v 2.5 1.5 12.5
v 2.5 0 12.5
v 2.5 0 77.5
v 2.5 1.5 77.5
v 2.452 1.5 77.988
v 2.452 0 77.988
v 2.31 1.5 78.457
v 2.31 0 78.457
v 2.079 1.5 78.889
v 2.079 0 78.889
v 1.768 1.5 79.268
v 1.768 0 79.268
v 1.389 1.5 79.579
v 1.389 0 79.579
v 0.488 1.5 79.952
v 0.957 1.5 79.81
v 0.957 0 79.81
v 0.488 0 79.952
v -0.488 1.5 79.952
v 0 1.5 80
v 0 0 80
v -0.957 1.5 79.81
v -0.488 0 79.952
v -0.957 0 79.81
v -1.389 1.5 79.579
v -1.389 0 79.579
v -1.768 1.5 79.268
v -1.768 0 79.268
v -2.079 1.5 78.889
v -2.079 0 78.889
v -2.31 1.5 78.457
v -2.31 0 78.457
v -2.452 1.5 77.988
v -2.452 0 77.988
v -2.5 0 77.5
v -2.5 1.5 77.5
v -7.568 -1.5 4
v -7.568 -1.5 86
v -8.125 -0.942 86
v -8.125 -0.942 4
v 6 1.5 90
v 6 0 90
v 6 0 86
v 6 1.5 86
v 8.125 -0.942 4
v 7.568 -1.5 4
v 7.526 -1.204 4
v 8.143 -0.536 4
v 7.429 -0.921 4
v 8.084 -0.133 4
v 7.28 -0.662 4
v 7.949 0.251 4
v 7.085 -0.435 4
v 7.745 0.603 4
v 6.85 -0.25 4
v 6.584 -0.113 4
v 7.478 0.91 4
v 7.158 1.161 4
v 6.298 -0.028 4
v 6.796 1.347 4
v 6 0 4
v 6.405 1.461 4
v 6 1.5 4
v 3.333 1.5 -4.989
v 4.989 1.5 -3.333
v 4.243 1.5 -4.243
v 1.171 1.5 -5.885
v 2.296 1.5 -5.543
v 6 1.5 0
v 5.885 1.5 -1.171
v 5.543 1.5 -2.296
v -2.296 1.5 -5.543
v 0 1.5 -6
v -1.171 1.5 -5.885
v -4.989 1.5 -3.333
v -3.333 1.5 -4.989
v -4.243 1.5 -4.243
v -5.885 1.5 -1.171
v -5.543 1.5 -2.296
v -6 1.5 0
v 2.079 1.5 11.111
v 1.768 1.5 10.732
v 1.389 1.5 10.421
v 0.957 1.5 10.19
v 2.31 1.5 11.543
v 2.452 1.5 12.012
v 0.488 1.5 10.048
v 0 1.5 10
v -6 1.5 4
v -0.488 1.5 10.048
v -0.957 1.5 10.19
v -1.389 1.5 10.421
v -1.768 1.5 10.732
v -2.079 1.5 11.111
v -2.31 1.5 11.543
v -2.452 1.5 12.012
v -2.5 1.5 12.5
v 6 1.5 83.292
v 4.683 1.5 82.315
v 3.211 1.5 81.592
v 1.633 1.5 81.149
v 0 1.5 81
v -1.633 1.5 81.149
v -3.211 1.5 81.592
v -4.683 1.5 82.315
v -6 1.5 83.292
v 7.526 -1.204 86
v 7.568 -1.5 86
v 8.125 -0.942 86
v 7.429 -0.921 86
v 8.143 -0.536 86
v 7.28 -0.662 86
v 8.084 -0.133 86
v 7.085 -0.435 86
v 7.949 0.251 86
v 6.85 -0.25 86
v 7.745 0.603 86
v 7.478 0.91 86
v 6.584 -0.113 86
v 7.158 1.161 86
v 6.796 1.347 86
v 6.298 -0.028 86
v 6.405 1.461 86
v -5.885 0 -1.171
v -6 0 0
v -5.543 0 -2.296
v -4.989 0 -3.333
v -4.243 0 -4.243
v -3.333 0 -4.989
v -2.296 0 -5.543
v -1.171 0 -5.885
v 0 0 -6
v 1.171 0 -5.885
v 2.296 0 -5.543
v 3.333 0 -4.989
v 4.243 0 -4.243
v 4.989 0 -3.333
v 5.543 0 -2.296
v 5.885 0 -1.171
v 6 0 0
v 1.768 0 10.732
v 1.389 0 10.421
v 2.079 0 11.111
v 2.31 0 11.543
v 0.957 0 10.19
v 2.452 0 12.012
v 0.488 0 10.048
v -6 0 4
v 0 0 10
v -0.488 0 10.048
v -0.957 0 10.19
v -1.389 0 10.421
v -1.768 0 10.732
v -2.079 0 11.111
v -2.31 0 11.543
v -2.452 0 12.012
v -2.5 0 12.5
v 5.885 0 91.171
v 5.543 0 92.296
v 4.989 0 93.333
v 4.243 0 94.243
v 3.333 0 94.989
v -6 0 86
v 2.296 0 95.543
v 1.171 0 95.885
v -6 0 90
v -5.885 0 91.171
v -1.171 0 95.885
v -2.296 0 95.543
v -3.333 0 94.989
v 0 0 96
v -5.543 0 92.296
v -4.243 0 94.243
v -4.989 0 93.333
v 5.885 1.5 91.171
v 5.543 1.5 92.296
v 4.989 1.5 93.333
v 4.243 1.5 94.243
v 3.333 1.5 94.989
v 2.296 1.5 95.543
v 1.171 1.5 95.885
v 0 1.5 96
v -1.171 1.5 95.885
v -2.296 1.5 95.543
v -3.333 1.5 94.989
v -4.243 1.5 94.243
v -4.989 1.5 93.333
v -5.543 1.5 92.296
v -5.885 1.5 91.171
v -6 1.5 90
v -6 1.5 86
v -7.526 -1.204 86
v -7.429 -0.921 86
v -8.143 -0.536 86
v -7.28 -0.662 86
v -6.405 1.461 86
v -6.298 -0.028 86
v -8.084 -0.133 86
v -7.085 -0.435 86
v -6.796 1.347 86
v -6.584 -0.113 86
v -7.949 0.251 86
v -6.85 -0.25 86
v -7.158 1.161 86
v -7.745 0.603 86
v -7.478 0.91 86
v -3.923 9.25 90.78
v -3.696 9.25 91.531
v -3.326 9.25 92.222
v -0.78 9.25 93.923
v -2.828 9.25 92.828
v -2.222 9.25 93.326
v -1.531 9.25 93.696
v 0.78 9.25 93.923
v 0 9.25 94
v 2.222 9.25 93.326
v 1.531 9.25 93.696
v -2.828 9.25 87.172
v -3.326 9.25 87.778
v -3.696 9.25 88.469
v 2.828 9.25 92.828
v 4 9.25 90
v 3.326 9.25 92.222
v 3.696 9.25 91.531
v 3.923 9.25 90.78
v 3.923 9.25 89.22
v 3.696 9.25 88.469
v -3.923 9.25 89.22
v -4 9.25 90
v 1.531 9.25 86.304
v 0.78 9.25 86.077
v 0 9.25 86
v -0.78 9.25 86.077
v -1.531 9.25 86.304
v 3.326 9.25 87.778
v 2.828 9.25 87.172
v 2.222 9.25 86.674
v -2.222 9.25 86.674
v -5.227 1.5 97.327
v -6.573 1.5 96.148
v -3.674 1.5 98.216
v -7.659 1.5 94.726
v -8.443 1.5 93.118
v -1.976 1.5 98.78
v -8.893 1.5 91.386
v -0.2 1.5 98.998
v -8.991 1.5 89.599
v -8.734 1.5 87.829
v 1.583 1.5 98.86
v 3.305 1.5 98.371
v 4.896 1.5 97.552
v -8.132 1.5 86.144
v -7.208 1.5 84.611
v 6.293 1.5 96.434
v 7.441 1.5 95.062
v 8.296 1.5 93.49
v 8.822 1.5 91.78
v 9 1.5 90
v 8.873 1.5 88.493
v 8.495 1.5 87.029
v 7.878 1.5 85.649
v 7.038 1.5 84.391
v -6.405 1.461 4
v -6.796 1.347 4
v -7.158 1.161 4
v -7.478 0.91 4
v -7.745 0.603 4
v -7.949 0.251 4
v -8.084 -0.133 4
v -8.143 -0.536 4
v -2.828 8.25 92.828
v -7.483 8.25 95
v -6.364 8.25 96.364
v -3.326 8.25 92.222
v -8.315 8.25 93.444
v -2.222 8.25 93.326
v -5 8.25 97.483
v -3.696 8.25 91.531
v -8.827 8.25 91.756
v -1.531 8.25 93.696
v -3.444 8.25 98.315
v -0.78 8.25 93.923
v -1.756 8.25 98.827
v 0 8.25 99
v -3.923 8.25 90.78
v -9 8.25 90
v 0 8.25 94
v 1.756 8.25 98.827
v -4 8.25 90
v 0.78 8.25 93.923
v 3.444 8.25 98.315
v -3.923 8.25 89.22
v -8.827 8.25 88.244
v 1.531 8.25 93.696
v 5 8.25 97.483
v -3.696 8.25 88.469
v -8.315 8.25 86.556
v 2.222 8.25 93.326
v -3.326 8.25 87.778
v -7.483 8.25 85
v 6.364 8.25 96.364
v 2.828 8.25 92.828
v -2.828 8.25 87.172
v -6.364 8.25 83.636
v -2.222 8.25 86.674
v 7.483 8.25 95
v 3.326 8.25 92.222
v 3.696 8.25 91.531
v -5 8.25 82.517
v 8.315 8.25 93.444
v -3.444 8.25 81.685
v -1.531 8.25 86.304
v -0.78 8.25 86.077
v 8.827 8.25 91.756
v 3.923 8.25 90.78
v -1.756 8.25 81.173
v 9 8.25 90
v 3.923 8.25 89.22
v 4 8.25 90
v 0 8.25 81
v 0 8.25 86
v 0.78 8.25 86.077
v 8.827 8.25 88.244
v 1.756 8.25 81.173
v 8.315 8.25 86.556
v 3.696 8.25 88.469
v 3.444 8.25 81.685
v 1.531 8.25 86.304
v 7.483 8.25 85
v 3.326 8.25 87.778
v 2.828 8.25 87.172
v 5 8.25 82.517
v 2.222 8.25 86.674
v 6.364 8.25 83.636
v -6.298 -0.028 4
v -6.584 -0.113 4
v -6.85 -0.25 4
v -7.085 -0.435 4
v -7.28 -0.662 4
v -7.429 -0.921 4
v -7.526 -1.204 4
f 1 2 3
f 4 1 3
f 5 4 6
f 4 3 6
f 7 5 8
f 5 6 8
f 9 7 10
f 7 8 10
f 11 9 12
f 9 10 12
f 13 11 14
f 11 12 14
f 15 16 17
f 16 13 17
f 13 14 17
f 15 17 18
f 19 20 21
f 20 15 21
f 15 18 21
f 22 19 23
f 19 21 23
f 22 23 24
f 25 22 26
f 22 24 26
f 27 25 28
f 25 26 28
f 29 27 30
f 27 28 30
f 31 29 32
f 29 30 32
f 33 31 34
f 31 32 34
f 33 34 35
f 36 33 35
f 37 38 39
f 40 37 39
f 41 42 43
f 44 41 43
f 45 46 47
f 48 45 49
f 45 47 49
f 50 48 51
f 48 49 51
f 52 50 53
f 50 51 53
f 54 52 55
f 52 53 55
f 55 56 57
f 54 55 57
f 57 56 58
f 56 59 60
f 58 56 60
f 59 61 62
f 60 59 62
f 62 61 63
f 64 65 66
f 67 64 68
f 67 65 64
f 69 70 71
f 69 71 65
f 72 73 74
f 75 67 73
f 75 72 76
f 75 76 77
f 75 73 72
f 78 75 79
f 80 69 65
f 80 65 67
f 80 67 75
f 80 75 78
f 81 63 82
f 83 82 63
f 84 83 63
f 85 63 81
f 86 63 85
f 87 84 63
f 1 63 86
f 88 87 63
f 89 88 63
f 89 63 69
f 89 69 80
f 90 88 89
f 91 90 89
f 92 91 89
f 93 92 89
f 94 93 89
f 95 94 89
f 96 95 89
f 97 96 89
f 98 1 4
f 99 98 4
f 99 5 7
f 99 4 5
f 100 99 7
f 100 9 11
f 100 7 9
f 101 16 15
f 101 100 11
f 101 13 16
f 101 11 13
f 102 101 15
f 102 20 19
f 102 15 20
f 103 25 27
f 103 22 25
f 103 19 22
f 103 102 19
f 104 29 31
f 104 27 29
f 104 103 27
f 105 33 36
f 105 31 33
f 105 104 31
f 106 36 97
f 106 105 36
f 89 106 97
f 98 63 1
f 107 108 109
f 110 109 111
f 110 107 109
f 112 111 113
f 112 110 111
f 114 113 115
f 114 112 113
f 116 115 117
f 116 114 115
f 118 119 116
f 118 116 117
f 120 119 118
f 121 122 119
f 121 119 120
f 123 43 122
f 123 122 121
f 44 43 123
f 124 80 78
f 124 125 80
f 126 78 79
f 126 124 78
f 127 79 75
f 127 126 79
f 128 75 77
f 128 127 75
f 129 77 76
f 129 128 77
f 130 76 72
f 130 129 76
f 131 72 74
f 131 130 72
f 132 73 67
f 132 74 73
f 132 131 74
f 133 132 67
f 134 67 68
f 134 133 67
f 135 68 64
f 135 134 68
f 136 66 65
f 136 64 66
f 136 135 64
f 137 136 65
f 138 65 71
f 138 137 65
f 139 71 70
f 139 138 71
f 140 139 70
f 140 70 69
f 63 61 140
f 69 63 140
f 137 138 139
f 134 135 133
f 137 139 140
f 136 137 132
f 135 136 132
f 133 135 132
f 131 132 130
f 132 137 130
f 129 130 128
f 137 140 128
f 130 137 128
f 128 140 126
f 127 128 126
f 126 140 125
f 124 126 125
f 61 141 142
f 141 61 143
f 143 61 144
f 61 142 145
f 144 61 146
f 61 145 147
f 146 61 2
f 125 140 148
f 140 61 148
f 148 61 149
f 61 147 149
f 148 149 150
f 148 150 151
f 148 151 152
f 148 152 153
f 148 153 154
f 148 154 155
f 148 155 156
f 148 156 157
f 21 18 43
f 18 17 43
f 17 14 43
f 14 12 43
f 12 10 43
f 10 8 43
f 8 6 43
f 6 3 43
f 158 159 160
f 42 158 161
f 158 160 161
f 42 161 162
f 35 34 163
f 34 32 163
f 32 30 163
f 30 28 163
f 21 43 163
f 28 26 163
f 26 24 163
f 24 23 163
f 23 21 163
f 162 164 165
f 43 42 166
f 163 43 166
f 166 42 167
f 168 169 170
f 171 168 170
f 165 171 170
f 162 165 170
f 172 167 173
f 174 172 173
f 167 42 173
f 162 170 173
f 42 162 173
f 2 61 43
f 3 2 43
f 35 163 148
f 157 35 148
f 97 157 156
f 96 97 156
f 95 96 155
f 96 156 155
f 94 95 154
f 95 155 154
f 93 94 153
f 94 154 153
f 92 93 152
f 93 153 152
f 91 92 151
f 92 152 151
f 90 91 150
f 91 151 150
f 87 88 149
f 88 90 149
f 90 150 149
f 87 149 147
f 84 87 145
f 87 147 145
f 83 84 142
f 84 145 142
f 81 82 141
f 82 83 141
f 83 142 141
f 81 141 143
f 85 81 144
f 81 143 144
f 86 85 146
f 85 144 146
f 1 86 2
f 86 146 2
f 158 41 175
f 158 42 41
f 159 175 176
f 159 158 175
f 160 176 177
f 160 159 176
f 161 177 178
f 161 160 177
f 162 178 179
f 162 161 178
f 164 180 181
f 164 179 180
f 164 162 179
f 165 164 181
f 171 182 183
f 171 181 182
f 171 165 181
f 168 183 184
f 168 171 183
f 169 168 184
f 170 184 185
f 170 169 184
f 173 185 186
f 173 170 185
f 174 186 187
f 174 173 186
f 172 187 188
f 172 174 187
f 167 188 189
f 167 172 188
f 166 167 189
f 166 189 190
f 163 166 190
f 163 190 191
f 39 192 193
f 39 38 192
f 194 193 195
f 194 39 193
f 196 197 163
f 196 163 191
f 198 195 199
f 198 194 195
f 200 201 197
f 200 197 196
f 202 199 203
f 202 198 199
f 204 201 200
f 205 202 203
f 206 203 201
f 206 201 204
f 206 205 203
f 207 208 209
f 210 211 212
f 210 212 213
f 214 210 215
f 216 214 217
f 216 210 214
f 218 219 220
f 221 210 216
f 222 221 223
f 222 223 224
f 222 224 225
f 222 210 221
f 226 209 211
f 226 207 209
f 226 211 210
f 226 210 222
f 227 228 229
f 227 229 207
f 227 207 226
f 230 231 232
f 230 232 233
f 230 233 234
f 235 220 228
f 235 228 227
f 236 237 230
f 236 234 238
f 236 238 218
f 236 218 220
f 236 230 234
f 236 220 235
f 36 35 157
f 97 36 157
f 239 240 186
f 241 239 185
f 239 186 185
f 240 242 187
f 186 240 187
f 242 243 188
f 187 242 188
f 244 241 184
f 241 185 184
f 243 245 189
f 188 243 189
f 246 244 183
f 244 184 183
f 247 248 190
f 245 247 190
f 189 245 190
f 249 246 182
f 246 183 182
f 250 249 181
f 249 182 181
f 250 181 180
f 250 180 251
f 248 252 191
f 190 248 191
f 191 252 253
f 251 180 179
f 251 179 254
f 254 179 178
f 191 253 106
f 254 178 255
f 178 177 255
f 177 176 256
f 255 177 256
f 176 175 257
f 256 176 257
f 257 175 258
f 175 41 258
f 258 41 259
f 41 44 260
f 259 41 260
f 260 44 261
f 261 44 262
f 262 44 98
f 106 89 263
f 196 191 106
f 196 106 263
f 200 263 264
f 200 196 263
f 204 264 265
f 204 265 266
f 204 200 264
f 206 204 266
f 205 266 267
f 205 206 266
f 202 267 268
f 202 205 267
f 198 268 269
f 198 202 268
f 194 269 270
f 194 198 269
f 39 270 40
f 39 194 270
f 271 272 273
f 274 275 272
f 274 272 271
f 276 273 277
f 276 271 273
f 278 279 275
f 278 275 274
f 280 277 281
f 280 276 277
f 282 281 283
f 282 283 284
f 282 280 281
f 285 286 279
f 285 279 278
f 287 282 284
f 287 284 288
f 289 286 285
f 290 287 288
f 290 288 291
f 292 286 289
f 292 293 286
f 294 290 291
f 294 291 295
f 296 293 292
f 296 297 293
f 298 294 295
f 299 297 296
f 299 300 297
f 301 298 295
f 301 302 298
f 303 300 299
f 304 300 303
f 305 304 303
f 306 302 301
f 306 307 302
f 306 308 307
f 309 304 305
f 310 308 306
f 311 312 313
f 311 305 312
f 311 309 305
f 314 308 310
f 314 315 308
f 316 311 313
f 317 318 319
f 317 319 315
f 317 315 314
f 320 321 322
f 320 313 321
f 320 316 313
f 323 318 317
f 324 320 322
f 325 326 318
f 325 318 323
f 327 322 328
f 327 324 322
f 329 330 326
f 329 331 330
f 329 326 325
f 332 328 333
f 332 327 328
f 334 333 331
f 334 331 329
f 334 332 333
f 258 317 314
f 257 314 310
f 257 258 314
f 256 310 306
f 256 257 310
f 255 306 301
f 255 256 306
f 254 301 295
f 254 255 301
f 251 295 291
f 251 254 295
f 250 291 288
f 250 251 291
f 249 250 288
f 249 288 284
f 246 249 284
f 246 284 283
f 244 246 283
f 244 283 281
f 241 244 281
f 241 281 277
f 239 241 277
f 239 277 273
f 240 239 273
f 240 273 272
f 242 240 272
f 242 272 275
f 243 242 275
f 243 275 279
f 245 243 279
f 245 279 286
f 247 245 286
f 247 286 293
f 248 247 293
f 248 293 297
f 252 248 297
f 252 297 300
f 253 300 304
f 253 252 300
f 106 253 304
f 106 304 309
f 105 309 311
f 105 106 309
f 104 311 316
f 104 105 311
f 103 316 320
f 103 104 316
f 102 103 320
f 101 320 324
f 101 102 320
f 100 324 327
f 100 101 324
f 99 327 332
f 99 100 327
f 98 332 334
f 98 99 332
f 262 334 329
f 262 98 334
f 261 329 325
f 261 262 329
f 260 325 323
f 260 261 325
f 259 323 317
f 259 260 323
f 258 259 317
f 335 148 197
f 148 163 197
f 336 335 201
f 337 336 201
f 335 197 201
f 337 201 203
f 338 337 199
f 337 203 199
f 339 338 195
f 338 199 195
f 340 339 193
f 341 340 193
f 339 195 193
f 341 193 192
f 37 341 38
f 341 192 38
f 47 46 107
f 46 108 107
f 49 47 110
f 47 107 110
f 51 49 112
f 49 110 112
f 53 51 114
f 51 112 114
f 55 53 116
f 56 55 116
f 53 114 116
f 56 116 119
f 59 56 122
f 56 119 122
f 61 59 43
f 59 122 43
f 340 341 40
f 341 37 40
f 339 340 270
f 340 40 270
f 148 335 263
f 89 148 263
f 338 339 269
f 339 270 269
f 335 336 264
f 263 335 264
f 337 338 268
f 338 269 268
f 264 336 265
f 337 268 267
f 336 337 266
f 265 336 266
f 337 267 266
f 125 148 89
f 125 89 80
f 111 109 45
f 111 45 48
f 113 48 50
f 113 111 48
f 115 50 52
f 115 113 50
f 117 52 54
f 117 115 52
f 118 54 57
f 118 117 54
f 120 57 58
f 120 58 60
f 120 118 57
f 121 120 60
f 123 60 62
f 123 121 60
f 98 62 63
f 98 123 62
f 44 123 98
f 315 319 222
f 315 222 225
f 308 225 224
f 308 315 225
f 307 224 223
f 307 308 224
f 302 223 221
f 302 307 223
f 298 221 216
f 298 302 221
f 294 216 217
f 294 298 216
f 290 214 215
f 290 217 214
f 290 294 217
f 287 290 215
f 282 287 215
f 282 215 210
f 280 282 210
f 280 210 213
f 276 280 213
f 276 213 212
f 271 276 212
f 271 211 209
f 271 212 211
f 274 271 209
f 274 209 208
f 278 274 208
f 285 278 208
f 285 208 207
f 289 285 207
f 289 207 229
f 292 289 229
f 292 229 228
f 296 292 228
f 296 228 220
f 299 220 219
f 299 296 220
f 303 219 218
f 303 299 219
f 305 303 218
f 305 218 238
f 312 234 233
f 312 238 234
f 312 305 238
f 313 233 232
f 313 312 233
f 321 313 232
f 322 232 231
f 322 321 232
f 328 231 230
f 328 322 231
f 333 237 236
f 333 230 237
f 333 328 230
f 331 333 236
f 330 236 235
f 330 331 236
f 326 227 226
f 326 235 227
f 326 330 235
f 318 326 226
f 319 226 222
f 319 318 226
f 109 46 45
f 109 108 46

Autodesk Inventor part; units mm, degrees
ref_plane "YZ Plane" through (0, 0, 0) normal (1, 0, 0) x (0, 1, 0)
ref_plane "XZ Plane" through (0, 0, 0) normal (0, 1, 0) x (-1, 0, 0)
sketch "Sketch1" plane through (0, 0, 0) normal (0, 1, 0) x (-1, 0, 0)
  circle A0 centre (0, 0) radius 6
  line L0 (0, 0) -> (0, 90) construction
  circle A1 centre (0, 90) radius 6
  line L1 (12.9035, -6) -> (-17.4473, -6) construction
  line L2 (12.9035, 96) -> (-17.4473, 96) construction
  line L3 (6, 90) -> (6, 0)
  line L4 (-6, 90) -> (-6, 0)
  line L5 (12.9035, 10) -> (-17.4473, 10) construction
  line L6 (12.7918, 80) -> (-17.559, 80) construction
  circle A2 centre (0, 77.5) radius 2.5
  circle A3 centre (0, 12.5) radius 2.5
  line L7 (2.5, 77.5) -> (2.5, 12.5)
  line L8 (-2.5, 12.5) -> (-2.5, 77.5)
  dimension "d0" = 12
  dimension "d1" = 12
  dimension "d2" = 102
  dimension "d3" = 70
  dimension "d4" = 16
  dimension "d5" = 5
  dimension "d6" = 5
extrude "Extrusion1" add sketch "Sketch1" along normal blind 1.5
ref_plane "Work Plane2" through (6, 0, 86) normal (0, 0, 1) x (0, 1, 0)
ref_plane "Work Plane1" through (6, 0, 90) normal (0, 0, 1) x (0, 1, 0)
sketch "Sketch2" plane through (6, 0, 86) normal (0, 0, 1) x (0, 1, 0)
  line L0 (1.5, 0) -> (1.5, 12) projected
  line L1 (-1.5, -2.125) -> (1.5, -2.125) construction
  line L2 (1.5, -2.125) -> (1.5, 14.125) construction
  line L3 (1.5, 14.125) -> (-1.5, 14.125) construction
  line L4 (-1.5, 14.125) -> (-1.5, -2.125) construction
  line L5 (0, 12) -> (1.5, 12) projected
  line L6 (0, 12) -> (0, 0) projected
  line L7 (0, 0) -> (1.5, 0) projected
  line L8 (1.5, 12) -> (1.5, 0) projected
  line L9 (0, 12) -> (1.5, 12) projected
  arc A0 (1.5, 12) -> (-0.9425, 14.125) centre (-0.6456, 12) ccw
  arc A1 (0, 12) -> (-1.5, 13.5675) centre (-1.569, 12) ccw
  line L10 (-1.5, 13.5675) -> (-0.9425, 14.125)
  line L11 (0, 0) -> (0, 12) projected
  line L12 (0, 6) -> (-3.8255, 6) construction
  arc A2 (-0.9425, -2.125) -> (1.5, 0) centre (-0.6456, 0) ccw
  arc A3 (-1.5, -1.5675) -> (0, 0) centre (-1.569, 0) ccw
  line L13 (-1.5, -1.5675) -> (-0.9425, -2.125)
  dimension "d11" = 3
  dimension "d12" = 16.25
  dimension "d13" = 2.125
  dimension "d15" = 1.5
  dimension "d16" = 45
extrude "Extrusion2" add sketch "Sketch2" against normal blind 82 contours A2 L13 A3 L7 | L5 A1 L10 A0
sketch "Sketch3" plane through (0, 1.5, 0) normal (0, 1, 0) x (1, 0, 0)
  arc A0 (-6, -90) -> (6, -90) centre (0, -90) ccw projected
  circle A1 centre (0, -90) radius 9
  point P0 (0, 0)
  dimension "d19" = 18
extrude "Extrusion3" add sketch "Sketch3" along normal blind 6.75
sketch "Sketch4" plane through (0, 8.25, 90) normal (0, 1, 0) x (1, 0, 0)
  circle A0 centre (0, 0) radius 4
  point P0 (0, 90)
  dimension "d22" = 8
extrude "Extrusion4" add sketch "Sketch4" along normal blind 1
equation "\"d1\" = d0"
equation "\"d6\" = d5"
properties part number "High Voltage Limit Switch Arm"
